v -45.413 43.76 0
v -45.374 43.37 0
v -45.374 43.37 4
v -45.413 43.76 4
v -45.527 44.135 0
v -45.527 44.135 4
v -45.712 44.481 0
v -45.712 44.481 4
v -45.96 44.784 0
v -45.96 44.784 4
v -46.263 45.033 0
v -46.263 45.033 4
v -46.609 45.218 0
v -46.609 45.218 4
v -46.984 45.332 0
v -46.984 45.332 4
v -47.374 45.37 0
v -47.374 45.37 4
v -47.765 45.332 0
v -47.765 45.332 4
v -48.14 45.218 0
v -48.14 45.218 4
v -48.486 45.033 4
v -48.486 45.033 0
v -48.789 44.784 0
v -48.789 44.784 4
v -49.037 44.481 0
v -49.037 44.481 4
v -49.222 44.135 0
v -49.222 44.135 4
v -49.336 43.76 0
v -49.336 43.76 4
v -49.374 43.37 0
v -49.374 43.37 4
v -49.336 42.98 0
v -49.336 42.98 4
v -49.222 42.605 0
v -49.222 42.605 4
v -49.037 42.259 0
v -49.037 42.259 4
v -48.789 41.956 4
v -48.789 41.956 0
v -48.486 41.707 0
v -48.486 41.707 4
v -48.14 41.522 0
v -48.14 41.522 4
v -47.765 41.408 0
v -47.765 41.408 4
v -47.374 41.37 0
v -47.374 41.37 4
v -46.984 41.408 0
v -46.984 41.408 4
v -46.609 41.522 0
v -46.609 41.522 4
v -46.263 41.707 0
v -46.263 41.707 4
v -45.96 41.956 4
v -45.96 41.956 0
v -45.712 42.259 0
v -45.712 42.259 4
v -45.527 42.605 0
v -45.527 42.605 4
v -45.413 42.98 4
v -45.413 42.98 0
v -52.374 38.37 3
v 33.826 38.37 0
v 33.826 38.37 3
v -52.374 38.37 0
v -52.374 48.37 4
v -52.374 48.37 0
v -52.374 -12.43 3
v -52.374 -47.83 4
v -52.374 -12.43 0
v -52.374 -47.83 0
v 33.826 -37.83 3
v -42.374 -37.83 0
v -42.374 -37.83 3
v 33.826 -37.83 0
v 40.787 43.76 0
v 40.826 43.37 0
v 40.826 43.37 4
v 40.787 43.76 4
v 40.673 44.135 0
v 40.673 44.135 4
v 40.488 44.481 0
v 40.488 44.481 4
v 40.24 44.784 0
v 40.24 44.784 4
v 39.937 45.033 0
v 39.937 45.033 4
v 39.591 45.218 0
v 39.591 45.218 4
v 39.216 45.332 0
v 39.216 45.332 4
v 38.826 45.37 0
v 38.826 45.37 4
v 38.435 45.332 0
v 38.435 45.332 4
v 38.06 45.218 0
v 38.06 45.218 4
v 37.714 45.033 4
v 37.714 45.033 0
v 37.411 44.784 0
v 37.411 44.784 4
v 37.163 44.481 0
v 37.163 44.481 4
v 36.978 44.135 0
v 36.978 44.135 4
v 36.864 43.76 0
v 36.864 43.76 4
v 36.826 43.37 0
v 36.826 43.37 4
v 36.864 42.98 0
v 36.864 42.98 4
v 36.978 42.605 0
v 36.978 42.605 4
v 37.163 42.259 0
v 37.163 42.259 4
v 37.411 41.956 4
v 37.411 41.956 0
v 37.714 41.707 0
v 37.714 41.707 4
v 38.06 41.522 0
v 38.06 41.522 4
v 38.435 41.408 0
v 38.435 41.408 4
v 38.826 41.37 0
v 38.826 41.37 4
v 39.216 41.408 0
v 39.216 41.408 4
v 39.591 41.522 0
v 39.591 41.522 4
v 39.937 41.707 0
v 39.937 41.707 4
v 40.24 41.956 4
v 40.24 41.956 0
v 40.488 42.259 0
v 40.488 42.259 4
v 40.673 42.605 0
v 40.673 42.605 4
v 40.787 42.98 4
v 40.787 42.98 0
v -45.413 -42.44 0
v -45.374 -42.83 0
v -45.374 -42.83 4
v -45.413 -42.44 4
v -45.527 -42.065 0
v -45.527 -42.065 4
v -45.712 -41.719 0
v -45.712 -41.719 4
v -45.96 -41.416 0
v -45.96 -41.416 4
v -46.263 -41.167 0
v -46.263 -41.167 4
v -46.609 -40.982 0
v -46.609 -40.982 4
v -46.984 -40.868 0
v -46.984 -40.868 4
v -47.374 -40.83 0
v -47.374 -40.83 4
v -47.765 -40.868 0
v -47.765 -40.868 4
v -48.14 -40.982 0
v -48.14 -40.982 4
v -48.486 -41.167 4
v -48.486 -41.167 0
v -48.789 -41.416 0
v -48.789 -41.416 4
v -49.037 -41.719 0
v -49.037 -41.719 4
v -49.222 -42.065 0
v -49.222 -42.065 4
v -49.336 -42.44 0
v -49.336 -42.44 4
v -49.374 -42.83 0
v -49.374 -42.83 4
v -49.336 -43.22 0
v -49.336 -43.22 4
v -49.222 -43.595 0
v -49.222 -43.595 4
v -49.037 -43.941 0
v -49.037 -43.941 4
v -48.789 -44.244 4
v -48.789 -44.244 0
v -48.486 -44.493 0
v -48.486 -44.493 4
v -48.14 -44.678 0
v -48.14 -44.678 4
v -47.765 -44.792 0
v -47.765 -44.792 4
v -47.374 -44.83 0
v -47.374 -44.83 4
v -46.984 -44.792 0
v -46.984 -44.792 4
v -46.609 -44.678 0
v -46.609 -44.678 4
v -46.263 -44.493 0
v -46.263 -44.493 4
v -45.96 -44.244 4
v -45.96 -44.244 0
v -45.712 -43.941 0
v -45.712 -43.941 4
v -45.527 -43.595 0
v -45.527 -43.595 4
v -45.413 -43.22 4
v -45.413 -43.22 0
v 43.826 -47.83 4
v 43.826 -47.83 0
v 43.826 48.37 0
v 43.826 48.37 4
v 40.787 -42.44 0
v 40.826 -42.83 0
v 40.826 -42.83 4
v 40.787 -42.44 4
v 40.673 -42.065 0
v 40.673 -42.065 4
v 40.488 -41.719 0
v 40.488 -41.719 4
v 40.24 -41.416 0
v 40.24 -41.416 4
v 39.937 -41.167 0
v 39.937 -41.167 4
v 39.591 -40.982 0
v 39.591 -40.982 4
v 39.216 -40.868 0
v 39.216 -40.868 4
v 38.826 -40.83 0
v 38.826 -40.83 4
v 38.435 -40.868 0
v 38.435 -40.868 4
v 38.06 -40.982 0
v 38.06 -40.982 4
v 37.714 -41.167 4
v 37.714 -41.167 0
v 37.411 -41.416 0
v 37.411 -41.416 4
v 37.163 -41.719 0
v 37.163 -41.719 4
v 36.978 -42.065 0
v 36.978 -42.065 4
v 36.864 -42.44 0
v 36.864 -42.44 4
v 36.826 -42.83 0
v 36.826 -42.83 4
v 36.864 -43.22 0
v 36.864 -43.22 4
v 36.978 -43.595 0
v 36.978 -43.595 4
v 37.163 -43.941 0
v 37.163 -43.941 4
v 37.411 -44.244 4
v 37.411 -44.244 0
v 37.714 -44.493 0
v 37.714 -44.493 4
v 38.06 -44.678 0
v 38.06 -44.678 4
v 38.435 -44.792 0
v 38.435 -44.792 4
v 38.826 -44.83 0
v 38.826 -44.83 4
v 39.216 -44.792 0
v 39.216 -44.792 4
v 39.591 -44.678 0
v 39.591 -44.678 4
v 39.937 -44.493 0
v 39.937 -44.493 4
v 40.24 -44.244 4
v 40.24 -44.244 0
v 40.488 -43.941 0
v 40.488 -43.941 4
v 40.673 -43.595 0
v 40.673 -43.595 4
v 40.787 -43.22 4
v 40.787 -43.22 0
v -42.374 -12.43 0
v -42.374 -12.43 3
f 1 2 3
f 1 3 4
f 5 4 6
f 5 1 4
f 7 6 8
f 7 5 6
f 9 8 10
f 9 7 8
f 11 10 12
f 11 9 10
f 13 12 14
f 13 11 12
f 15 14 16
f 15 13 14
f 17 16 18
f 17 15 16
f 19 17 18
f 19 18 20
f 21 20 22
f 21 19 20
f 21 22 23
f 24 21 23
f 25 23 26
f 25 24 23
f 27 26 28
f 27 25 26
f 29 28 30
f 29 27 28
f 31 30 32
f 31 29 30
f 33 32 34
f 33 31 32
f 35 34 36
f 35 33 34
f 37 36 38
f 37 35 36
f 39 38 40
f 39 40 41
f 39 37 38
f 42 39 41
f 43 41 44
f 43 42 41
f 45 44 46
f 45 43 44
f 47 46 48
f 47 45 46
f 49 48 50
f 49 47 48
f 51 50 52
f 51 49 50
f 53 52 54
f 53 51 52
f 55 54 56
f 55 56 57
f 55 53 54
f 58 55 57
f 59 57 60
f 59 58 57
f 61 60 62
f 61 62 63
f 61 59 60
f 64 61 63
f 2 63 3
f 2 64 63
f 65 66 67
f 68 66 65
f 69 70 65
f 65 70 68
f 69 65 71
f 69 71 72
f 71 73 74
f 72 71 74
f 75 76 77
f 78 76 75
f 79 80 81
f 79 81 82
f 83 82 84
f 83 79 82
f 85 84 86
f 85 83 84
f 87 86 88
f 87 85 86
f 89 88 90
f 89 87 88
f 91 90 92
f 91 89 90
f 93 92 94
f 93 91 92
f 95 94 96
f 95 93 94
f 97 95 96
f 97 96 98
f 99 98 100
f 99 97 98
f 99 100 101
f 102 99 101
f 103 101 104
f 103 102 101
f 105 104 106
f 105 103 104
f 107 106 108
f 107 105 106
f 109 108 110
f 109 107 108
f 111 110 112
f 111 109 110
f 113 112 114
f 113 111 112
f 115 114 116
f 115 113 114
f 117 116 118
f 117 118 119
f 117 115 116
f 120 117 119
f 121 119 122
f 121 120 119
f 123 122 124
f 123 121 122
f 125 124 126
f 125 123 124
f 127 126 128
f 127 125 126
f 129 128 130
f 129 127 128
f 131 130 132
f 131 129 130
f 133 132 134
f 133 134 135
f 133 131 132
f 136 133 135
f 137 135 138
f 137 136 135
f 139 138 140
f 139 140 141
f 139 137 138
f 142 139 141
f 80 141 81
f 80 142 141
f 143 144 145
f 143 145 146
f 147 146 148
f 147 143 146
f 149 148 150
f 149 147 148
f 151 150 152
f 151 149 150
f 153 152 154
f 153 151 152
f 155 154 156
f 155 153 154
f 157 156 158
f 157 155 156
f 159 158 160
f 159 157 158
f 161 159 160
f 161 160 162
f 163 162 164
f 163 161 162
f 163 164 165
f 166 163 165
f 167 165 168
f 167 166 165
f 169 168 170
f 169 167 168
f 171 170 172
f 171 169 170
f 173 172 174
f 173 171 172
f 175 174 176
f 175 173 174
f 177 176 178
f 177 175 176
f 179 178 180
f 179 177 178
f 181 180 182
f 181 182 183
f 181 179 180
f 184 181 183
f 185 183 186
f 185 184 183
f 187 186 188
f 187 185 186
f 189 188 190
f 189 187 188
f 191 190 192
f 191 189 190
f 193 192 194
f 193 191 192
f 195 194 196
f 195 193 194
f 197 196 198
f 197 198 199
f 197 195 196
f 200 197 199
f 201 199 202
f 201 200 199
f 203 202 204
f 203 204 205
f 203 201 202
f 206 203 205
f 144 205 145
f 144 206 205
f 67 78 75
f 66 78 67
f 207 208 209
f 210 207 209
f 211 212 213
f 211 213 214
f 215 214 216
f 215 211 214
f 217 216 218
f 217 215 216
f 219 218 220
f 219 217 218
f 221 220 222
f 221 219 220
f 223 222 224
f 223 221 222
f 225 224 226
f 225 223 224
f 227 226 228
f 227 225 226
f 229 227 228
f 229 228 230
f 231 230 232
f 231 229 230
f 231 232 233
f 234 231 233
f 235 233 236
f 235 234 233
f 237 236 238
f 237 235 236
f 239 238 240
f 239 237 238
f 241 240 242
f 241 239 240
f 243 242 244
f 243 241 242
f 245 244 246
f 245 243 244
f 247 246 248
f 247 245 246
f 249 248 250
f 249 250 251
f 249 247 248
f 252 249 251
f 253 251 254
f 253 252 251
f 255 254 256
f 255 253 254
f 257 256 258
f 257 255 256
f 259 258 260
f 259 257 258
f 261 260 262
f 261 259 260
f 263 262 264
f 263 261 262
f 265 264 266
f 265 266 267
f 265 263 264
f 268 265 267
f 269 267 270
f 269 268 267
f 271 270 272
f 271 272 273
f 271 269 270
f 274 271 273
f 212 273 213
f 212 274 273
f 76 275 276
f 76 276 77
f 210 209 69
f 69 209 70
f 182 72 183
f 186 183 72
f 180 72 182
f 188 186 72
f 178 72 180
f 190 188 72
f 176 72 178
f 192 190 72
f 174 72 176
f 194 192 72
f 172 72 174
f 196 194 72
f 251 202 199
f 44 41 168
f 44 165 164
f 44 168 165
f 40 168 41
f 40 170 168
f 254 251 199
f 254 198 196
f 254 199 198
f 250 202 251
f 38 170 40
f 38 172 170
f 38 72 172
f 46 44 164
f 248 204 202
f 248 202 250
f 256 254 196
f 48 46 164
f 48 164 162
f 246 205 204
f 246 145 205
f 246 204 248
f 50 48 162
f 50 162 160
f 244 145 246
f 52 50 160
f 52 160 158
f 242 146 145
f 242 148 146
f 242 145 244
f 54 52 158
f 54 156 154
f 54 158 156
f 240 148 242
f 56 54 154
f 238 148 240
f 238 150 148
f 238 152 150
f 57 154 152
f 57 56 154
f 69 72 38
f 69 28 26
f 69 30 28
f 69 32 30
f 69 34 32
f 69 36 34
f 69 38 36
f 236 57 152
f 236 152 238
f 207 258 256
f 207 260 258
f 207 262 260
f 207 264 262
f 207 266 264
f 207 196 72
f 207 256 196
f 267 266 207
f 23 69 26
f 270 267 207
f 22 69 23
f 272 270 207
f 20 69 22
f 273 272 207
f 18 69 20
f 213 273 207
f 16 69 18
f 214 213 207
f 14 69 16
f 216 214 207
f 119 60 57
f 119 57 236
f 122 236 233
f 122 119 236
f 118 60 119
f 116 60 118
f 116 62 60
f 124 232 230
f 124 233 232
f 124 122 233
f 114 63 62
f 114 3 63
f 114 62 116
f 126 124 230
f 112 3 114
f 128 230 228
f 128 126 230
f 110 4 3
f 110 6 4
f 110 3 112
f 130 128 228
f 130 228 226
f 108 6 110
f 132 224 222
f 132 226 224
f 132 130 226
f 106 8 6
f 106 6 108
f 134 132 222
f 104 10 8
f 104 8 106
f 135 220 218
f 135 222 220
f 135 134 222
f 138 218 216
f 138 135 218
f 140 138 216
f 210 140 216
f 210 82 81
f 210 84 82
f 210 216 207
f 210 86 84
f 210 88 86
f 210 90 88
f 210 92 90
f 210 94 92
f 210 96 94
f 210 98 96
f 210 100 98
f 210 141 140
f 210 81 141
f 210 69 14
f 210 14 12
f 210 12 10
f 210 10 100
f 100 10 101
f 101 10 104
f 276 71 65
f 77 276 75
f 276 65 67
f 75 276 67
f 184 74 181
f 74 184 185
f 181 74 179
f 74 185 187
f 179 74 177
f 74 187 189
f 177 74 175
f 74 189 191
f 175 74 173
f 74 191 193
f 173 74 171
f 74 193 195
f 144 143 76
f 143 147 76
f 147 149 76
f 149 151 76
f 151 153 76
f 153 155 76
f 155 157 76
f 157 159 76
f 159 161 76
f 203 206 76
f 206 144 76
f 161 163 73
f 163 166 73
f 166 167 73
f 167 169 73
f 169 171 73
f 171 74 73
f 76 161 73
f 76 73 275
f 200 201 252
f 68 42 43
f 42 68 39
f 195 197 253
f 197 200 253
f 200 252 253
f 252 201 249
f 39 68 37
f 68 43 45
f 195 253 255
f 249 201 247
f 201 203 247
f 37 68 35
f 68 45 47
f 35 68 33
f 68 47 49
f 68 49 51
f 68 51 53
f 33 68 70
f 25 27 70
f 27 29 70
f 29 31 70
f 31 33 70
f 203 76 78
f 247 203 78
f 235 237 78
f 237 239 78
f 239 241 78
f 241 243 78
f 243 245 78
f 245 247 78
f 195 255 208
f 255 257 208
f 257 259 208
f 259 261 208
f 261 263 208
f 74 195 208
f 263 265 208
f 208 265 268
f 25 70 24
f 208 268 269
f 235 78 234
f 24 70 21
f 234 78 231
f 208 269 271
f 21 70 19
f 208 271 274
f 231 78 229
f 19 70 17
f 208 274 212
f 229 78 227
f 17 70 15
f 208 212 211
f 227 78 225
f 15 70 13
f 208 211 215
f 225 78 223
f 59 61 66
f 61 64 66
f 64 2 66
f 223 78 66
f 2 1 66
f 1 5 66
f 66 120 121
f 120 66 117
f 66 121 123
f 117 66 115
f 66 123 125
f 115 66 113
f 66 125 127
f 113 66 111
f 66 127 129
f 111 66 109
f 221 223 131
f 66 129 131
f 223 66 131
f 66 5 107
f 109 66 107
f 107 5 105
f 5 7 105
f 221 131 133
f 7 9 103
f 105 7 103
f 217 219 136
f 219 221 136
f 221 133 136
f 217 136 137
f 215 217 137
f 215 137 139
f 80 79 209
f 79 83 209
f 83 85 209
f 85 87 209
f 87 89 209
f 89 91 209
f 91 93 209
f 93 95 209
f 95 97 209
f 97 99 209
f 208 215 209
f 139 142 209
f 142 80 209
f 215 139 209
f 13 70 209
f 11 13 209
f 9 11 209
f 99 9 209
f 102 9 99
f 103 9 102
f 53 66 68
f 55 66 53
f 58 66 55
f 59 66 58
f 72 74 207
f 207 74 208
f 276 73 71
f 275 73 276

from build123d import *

# Parameters (mm, degrees)
F0_R     = 2
F1_DEPTH = 4
F2_DEPTH = 4
F3_DEPTH = 3


with BuildPart() as f1:
    # F0 (on Top) → F1 (new body)
    with BuildSketch(Plane.XY):
        Polygon((38.825550833, 38.3700664616), (43.825550833, 38.3700664616), (43.825550833, 43.3700664616), (43.825550833, 48.3700664616), (33.825550833, 48.3700664616), (33.825550833, 38.4970664616), (33.825550833, 38.3700664616), (34.0726979835, 38.3700664616), align=None)
        with Locations((38.825550833, 43.3700664616)):
            Circle(F0_R, mode=Mode.SUBTRACT)
        Polygon((-42.374449167, 48.3700664616), (-42.374449167, 38.3700664616), (-42.120449167, 38.3700664616), (-38.437449167, 38.3700664616), (29.888550833, 38.3700664616), (33.571550833, 38.3700664616), (33.825550833, 38.3700664616), (33.825550833, 38.4970664616), (33.825550833, 48.3700664616), align=None)
        Polygon((33.825550833, -37.5759335384), (33.825550833, -37.8299335384), (33.9456979835, -37.8299335384), (43.825550833, -37.8299335384), (43.825550833, 38.3700664616), (38.825550833, 38.3700664616), (34.0726979835, 38.3700664616), (33.825550833, 38.3700664616), (33.825550833, 38.1160664616), (33.825550833, 34.4330664616), (33.825550833, 22.7744664616), (33.825550833, 16.7800664616), (33.825550833, -1.6349335384), (33.825550833, -6.0799335384), (33.825550833, -19.9229335384), (33.825550833, -20.0499335384), (33.825550833, -33.8929335384), align=None)
        Polygon((-52.374449167, 43.3700664616), (-52.374449167, 38.3700664616), (-47.374449167, 38.3700664616), (-42.374449167, 38.3700664616), (-42.374449167, 48.3700664616), (-52.374449167, 48.3700664616), align=None)
        with Locations((-47.374449167, 43.3700664616)):
            Circle(F0_R, mode=Mode.SUBTRACT)
        Polygon((-52.374449167, 38.3700664616), (-52.374449167, -12.4299335384), (-42.374449167, -12.4299335384), (-42.374449167, 34.4330664616), (-42.374449167, 38.1160664616), (-42.374449167, 38.3700664616), (-47.374449167, 38.3700664616), align=None)
        Polygon((-52.374449167, -42.8299335384), (-52.374449167, -47.8299335384), (-47.374449167, -47.8299335384), (-42.374449167, -47.8299335384), (-42.374449167, -37.8299335384), (-52.374449167, -37.8299335384), align=None)
        with Locations((-47.374449167, -42.8299335384)):
            Circle(F0_R, mode=Mode.SUBTRACT)
        Polygon((-42.374449167, -37.8299335384), (-42.374449167, -47.8299335384), (33.825550833, -47.8299335384), (33.825550833, -37.8299335384), (33.571550833, -37.8299335384), (33.317550833, -37.8299335384), (31.285550833, -37.8299335384), (30.269550833, -37.8299335384), (29.888550833, -37.8299335384), (13.302350833, -37.8299335384), (5.885550833, -37.8299335384), (2.253350833, -37.8299335384), (-38.437449167, -37.8299335384), (-42.120449167, -37.8299335384), align=None)
        Polygon((33.825550833, -37.8299335384), (33.825550833, -47.8299335384), (38.825550833, -47.8299335384), (43.825550833, -47.8299335384), (43.825550833, -42.8299335384), (43.825550833, -37.8299335384), (33.9456979835, -37.8299335384), align=None)
        with Locations((38.825550833, -42.8299335384)):
            Circle(F0_R, mode=Mode.SUBTRACT)
    extrude(amount=F1_DEPTH)

    # F0 (on Top) → F2 (join)
    with BuildSketch(Plane.XY):
        Polygon((-52.374449167, -12.4299335384), (-52.374449167, -37.8299335384), (-42.374449167, -37.8299335384), (-42.374449167, -37.5759335384), (-42.374449167, -36.0798128688), (-42.374449167, -33.8929335384), (-42.374449167, -12.4299335384), align=None)
        Polygon((-42.374449167, -37.5759335384), (-42.374449167, -37.8299335384), (-42.120449167, -37.8299335384), (-38.437449167, -37.8299335384), (2.253350833, -37.8299335384), (5.885550833, -37.8299335384), (13.302350833, -37.8299335384), (29.888550833, -37.8299335384), (30.269550833, -37.8299335384), (31.285550833, -37.8299335384), (33.317550833, -37.8299335384), (33.571550833, -37.8299335384), (33.825550833, -37.8299335384), (33.825550833, -37.5759335384), (33.825550833, -33.8929335384), (33.825550833, -20.0499335384), (33.825550833, -19.9229335384), (33.825550833, -6.0799335384), (33.825550833, -1.6349335384), (33.825550833, 16.7800664616), (33.825550833, 22.7744664616), (33.825550833, 34.4330664616), (33.825550833, 38.1160664616), (33.825550833, 38.3700664616), (33.571550833, 38.3700664616), (29.888550833, 38.3700664616), (-38.437449167, 38.3700664616), (-42.120449167, 38.3700664616), (-42.374449167, 38.3700664616), (-42.374449167, 38.1160664616), (-42.374449167, 34.4330664616), (-42.374449167, -12.4299335384), (-42.374449167, -33.8929335384), (-42.374449167, -36.0798128688), align=None)
    extrude(amount=F2_DEPTH)

    # F0 (on Top) → F3 (cut)
    with BuildSketch(Plane.XY):
        Polygon((-42.374449167, -37.5759335384), (-42.374449167, -37.8299335384), (-42.120449167, -37.8299335384), (-38.437449167, -37.8299335384), (2.253350833, -37.8299335384), (5.885550833, -37.8299335384), (13.302350833, -37.8299335384), (29.888550833, -37.8299335384), (30.269550833, -37.8299335384), (31.285550833, -37.8299335384), (33.317550833, -37.8299335384), (33.571550833, -37.8299335384), (33.825550833, -37.8299335384), (33.825550833, -37.5759335384), (33.825550833, -33.8929335384), (33.825550833, -20.0499335384), (33.825550833, -19.9229335384), (33.825550833, -6.0799335384), (33.825550833, -1.6349335384), (33.825550833, 16.7800664616), (33.825550833, 22.7744664616), (33.825550833, 34.4330664616), (33.825550833, 38.1160664616), (33.825550833, 38.3700664616), (33.571550833, 38.3700664616), (29.888550833, 38.3700664616), (-38.437449167, 38.3700664616), (-42.120449167, 38.3700664616), (-42.374449167, 38.3700664616), (-42.374449167, 38.1160664616), (-42.374449167, 34.4330664616), (-42.374449167, -12.4299335384), (-42.374449167, -33.8929335384), (-42.374449167, -36.0798128688), align=None)
        Polygon((-52.374449167, 38.3700664616), (-52.374449167, -12.4299335384), (-42.374449167, -12.4299335384), (-42.374449167, 34.4330664616), (-42.374449167, 38.1160664616), (-42.374449167, 38.3700664616), (-47.374449167, 38.3700664616), align=None)
    extrude(amount=F3_DEPTH, mode=Mode.SUBTRACT)


solid = f1.part
